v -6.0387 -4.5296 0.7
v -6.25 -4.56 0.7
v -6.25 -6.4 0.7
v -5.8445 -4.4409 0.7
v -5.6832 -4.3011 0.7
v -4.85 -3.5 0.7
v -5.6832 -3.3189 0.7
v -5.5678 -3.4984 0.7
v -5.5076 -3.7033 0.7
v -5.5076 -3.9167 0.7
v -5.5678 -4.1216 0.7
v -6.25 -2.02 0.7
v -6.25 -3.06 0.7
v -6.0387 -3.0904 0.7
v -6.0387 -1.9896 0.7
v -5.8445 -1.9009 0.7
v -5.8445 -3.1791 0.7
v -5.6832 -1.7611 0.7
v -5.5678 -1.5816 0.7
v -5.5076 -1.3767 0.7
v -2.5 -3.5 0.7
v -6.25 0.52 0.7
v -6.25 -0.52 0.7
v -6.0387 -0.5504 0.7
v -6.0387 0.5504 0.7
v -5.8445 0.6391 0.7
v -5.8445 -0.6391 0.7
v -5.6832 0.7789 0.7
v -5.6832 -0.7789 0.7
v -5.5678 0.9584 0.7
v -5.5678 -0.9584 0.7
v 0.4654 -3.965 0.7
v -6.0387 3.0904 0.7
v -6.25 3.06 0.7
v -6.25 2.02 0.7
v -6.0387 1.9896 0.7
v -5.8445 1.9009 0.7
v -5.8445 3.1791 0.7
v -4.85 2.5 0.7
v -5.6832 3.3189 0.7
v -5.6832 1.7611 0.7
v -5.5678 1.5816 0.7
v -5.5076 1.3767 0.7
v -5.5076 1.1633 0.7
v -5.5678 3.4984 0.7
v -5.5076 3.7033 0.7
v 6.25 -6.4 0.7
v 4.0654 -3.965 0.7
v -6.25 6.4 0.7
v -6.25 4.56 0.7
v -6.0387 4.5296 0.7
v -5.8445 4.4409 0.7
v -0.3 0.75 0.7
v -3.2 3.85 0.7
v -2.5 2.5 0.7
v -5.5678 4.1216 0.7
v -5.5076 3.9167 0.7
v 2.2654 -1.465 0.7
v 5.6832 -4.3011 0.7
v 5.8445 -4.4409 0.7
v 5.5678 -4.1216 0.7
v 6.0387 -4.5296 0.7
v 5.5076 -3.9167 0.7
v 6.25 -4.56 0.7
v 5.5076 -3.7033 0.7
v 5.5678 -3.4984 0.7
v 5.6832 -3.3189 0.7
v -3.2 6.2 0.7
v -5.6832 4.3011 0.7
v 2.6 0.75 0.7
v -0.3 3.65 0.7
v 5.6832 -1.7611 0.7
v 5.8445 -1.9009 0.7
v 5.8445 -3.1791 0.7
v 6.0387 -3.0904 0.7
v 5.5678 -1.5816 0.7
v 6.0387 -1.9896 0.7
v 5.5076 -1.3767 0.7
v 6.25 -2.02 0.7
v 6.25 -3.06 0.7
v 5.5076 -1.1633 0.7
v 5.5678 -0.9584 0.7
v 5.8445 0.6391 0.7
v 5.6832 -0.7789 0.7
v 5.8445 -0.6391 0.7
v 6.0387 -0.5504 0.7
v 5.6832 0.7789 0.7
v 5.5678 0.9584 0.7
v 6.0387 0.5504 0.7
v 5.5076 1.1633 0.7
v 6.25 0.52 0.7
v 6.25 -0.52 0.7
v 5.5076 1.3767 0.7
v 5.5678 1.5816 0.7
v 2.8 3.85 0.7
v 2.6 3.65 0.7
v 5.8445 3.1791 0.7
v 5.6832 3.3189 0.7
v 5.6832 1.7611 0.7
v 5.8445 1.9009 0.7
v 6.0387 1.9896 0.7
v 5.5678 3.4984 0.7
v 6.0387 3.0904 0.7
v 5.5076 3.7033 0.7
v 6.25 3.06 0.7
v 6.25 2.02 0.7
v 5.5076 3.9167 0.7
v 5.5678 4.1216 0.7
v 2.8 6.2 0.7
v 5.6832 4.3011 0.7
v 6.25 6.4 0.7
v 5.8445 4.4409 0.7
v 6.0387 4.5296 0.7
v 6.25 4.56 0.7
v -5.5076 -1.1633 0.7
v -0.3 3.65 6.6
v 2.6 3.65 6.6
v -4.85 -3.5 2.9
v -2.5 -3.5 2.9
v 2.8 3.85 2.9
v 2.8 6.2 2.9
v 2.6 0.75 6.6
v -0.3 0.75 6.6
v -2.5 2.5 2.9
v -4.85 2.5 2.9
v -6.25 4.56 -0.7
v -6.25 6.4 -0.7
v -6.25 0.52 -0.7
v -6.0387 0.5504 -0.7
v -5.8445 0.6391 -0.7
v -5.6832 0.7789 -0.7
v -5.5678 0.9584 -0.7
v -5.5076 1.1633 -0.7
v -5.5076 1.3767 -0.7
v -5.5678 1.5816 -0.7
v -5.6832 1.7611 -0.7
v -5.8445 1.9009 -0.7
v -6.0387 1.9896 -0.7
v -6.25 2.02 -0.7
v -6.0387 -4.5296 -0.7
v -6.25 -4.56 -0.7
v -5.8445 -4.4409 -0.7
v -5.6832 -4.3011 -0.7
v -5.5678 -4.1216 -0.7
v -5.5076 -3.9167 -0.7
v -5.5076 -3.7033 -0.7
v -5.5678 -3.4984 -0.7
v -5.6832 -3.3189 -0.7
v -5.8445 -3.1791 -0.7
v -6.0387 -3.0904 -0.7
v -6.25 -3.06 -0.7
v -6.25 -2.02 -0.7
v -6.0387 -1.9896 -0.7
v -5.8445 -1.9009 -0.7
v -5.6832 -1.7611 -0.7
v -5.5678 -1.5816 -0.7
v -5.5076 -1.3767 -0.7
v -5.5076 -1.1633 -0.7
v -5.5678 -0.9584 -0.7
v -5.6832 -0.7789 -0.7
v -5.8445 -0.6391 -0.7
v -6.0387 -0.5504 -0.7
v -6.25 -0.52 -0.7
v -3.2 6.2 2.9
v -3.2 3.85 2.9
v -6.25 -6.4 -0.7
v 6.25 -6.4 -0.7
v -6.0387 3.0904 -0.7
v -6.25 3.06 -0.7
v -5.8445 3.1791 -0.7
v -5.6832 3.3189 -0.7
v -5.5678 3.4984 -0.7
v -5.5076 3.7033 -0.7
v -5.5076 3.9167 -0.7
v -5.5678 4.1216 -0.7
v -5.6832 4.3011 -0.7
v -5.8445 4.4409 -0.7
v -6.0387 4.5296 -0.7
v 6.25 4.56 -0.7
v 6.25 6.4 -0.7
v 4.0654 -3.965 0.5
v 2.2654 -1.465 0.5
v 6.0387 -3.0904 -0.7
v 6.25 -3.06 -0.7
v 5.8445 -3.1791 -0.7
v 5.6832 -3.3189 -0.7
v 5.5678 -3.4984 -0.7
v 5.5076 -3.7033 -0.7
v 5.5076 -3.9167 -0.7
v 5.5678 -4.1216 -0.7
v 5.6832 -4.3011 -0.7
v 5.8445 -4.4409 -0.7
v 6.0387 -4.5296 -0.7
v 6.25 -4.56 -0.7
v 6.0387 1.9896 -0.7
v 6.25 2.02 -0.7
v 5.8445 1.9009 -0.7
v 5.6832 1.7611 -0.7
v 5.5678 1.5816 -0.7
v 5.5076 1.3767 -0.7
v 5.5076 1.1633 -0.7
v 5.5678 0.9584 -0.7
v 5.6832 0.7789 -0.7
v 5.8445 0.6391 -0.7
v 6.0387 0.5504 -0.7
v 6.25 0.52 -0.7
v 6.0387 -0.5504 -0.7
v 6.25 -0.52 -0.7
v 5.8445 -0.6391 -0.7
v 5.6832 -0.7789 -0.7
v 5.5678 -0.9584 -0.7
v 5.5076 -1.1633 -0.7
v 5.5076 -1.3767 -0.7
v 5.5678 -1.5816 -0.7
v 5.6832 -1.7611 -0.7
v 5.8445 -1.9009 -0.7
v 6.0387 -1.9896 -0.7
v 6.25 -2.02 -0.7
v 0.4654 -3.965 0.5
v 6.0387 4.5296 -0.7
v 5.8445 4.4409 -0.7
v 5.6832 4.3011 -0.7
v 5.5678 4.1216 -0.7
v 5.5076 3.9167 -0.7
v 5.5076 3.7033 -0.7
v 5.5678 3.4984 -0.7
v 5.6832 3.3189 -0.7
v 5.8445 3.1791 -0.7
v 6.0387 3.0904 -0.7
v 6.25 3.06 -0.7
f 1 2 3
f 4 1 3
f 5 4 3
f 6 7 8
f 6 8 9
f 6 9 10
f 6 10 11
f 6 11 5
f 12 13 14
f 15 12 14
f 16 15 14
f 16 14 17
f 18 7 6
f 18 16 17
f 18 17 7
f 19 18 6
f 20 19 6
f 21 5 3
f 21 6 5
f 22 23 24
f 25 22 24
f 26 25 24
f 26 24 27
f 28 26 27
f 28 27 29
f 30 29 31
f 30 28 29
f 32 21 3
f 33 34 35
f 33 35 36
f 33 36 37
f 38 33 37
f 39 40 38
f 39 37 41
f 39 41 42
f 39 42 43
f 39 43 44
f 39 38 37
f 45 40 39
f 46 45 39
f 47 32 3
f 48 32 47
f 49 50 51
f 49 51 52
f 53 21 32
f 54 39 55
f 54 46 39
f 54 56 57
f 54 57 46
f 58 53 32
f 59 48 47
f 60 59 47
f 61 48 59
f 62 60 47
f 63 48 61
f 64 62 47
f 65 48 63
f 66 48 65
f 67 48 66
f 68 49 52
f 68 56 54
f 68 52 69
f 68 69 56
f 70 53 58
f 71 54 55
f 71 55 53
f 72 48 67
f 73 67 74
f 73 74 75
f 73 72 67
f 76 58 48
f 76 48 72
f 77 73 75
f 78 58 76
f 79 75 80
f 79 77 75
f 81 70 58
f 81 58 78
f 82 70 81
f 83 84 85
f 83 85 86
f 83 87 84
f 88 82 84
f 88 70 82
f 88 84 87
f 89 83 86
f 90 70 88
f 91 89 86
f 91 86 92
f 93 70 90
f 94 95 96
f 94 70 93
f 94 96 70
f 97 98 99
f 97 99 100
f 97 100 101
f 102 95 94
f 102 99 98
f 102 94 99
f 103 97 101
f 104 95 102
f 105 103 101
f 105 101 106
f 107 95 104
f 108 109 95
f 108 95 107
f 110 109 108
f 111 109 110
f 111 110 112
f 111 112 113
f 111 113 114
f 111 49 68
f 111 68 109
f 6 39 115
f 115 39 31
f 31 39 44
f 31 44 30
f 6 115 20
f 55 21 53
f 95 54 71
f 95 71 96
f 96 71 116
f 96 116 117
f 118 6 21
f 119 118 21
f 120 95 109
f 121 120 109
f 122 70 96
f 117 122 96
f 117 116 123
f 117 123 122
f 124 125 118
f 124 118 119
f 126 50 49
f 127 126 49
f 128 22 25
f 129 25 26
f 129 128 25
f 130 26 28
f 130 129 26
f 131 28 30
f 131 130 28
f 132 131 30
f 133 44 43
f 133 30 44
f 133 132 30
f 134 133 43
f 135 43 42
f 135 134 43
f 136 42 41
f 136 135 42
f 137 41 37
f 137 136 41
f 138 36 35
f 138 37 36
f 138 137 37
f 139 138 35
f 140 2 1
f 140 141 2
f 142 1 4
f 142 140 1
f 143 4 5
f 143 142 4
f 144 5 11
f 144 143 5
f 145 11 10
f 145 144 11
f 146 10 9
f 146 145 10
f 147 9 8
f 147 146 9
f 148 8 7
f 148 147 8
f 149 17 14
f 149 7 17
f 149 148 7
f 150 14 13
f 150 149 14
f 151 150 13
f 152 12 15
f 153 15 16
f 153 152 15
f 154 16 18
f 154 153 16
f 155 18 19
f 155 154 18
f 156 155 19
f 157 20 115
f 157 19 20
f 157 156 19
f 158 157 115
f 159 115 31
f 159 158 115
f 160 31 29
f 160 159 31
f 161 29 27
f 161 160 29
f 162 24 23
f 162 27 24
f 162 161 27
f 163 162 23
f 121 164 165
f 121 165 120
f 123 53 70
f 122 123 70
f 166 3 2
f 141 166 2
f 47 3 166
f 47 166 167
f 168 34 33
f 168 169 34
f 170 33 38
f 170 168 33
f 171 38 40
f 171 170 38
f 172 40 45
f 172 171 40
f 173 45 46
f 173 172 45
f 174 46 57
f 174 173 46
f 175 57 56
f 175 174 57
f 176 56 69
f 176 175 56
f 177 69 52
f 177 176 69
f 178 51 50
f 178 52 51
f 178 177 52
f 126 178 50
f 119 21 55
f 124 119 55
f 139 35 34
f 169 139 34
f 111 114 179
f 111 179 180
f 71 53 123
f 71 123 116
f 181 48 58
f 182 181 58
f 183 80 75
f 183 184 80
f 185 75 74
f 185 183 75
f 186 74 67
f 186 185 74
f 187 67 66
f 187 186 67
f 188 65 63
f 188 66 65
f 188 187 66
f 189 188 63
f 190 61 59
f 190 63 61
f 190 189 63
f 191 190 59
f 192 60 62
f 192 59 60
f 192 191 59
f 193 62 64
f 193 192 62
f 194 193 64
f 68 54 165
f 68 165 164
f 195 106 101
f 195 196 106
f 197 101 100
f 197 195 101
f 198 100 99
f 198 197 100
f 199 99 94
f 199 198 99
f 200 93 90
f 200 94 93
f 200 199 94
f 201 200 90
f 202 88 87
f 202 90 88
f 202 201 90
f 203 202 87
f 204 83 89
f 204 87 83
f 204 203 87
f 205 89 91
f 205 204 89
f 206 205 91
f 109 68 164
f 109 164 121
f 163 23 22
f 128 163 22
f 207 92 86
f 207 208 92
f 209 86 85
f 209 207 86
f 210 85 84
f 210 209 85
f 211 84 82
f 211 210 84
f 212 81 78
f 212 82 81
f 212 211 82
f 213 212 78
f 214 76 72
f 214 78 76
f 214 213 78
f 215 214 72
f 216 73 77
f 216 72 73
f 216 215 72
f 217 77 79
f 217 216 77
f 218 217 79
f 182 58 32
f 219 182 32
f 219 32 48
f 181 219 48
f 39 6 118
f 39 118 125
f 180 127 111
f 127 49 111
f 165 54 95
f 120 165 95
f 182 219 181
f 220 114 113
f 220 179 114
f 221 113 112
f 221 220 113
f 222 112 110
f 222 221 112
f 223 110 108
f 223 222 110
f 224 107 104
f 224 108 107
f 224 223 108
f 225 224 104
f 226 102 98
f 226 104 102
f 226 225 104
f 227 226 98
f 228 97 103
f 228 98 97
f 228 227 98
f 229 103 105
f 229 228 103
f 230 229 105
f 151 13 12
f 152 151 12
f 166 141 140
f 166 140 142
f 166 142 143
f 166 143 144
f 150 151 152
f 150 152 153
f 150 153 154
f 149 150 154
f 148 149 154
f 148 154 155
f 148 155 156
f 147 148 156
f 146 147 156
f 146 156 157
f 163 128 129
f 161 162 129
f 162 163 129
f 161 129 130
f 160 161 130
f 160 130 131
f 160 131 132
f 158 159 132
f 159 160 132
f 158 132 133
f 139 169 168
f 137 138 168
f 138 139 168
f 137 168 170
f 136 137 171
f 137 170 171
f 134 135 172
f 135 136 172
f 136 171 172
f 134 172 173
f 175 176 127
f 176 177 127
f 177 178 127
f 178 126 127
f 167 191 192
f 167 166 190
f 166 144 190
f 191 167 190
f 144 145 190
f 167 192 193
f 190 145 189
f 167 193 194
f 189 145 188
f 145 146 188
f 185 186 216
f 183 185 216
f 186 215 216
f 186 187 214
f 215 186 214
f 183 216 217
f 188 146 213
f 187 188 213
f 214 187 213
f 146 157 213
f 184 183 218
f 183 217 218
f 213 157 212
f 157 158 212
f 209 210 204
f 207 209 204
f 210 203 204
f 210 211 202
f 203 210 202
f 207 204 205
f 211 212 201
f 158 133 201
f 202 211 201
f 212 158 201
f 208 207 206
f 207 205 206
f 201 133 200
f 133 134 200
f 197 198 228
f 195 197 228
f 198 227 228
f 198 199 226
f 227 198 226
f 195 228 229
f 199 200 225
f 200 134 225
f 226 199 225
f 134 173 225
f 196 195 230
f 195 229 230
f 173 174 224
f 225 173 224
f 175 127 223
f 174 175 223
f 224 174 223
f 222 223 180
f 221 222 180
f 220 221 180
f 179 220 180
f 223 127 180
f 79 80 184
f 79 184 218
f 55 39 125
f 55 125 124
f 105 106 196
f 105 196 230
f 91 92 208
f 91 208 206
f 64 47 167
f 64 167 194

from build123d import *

# Parameters (mm, degrees)
SKETCH1_W               = 12.5
SKETCH1_H               = 12.8
BOSS_EXTRUDE1_DEPTH     = 0.7
CUT_EXTRUDE1_DEPTH      = 9.972875793
CUT_EXTRUDE1_DEPTH_BACK = 9.972875793
SKETCH2_R               = 0.75
SKETCH3_W               = 6
SKETCH3_H               = 2.35
SKETCH3_W_2             = 2.35
SKETCH3_H_2             = 6
BOSS_EXTRUDE2_DEPTH     = 2.2
SKETCH4_W               = 2.9
SKETCH4_H               = 2.9
BOSS_EXTRUDE3_DEPTH     = 5.9
CUT_EXTRUDE2_DEPTH      = 0.2


with BuildPart() as part:
    # Sketch1 → Boss-Extrude1 (new, symmetric)
    with BuildSketch(Plane.XY):
        Rectangle(SKETCH1_W, SKETCH1_H)
    extrude(amount=BOSS_EXTRUDE1_DEPTH, both=True)

    # Sketch2 → Cut-Extrude1 (cut, two sides: drawn at the far end of the back side and taken through both)
    with BuildSketch(Plane.XY.offset(-CUT_EXTRUDE1_DEPTH_BACK)):
        with Locations((-6.25, 1.27)):
            Circle(SKETCH2_R)
        with Locations((-6.25, 3.81)):
            Circle(SKETCH2_R)
        with Locations((-6.25, -1.27)):
            Circle(SKETCH2_R)
        with Locations((-6.25, -3.81)):
            Circle(SKETCH2_R)
        with Locations((6.25, -3.81)):
            Circle(SKETCH2_R)
        with Locations((6.25, -1.27)):
            Circle(SKETCH2_R)
        with Locations((6.25, 3.81)):
            Circle(SKETCH2_R)
        with Locations((6.25, 1.27)):
            Circle(SKETCH2_R)
    extrude(amount=CUT_EXTRUDE1_DEPTH + CUT_EXTRUDE1_DEPTH_BACK, mode=Mode.SUBTRACT)

    # Sketch3 → Boss-Extrude2 (add)
    with BuildSketch(Plane.XY.offset(0.7)):
        with Locations((-0.2, 5.025)):
            Rectangle(SKETCH3_W, SKETCH3_H)
        with Locations((-3.675, -0.5)):
            Rectangle(SKETCH3_W_2, SKETCH3_H_2)
    extrude(amount=BOSS_EXTRUDE2_DEPTH)

    # Sketch4 → Boss-Extrude3 (add)
    with BuildSketch(Plane.XY.offset(0.7)):
        with Locations((1.15, 2.2)):
            Rectangle(SKETCH4_W, SKETCH4_H)
    extrude(amount=BOSS_EXTRUDE3_DEPTH)

    # Sketch6 → Cut-Extrude2 (cut)
    with BuildSketch(Plane.XY.offset(0.7)):
        Polygon((2.26536139, -3.964970683), (2.26536139, -1.464970683), (0.46536139, -3.964970683), align=None)
        Polygon((4.06536139, -3.964970683), (2.26536139, -1.464970683), (2.26536139, -3.964970683), align=None)
    extrude(amount=-CUT_EXTRUDE2_DEPTH, mode=Mode.SUBTRACT)


solid = part.part
